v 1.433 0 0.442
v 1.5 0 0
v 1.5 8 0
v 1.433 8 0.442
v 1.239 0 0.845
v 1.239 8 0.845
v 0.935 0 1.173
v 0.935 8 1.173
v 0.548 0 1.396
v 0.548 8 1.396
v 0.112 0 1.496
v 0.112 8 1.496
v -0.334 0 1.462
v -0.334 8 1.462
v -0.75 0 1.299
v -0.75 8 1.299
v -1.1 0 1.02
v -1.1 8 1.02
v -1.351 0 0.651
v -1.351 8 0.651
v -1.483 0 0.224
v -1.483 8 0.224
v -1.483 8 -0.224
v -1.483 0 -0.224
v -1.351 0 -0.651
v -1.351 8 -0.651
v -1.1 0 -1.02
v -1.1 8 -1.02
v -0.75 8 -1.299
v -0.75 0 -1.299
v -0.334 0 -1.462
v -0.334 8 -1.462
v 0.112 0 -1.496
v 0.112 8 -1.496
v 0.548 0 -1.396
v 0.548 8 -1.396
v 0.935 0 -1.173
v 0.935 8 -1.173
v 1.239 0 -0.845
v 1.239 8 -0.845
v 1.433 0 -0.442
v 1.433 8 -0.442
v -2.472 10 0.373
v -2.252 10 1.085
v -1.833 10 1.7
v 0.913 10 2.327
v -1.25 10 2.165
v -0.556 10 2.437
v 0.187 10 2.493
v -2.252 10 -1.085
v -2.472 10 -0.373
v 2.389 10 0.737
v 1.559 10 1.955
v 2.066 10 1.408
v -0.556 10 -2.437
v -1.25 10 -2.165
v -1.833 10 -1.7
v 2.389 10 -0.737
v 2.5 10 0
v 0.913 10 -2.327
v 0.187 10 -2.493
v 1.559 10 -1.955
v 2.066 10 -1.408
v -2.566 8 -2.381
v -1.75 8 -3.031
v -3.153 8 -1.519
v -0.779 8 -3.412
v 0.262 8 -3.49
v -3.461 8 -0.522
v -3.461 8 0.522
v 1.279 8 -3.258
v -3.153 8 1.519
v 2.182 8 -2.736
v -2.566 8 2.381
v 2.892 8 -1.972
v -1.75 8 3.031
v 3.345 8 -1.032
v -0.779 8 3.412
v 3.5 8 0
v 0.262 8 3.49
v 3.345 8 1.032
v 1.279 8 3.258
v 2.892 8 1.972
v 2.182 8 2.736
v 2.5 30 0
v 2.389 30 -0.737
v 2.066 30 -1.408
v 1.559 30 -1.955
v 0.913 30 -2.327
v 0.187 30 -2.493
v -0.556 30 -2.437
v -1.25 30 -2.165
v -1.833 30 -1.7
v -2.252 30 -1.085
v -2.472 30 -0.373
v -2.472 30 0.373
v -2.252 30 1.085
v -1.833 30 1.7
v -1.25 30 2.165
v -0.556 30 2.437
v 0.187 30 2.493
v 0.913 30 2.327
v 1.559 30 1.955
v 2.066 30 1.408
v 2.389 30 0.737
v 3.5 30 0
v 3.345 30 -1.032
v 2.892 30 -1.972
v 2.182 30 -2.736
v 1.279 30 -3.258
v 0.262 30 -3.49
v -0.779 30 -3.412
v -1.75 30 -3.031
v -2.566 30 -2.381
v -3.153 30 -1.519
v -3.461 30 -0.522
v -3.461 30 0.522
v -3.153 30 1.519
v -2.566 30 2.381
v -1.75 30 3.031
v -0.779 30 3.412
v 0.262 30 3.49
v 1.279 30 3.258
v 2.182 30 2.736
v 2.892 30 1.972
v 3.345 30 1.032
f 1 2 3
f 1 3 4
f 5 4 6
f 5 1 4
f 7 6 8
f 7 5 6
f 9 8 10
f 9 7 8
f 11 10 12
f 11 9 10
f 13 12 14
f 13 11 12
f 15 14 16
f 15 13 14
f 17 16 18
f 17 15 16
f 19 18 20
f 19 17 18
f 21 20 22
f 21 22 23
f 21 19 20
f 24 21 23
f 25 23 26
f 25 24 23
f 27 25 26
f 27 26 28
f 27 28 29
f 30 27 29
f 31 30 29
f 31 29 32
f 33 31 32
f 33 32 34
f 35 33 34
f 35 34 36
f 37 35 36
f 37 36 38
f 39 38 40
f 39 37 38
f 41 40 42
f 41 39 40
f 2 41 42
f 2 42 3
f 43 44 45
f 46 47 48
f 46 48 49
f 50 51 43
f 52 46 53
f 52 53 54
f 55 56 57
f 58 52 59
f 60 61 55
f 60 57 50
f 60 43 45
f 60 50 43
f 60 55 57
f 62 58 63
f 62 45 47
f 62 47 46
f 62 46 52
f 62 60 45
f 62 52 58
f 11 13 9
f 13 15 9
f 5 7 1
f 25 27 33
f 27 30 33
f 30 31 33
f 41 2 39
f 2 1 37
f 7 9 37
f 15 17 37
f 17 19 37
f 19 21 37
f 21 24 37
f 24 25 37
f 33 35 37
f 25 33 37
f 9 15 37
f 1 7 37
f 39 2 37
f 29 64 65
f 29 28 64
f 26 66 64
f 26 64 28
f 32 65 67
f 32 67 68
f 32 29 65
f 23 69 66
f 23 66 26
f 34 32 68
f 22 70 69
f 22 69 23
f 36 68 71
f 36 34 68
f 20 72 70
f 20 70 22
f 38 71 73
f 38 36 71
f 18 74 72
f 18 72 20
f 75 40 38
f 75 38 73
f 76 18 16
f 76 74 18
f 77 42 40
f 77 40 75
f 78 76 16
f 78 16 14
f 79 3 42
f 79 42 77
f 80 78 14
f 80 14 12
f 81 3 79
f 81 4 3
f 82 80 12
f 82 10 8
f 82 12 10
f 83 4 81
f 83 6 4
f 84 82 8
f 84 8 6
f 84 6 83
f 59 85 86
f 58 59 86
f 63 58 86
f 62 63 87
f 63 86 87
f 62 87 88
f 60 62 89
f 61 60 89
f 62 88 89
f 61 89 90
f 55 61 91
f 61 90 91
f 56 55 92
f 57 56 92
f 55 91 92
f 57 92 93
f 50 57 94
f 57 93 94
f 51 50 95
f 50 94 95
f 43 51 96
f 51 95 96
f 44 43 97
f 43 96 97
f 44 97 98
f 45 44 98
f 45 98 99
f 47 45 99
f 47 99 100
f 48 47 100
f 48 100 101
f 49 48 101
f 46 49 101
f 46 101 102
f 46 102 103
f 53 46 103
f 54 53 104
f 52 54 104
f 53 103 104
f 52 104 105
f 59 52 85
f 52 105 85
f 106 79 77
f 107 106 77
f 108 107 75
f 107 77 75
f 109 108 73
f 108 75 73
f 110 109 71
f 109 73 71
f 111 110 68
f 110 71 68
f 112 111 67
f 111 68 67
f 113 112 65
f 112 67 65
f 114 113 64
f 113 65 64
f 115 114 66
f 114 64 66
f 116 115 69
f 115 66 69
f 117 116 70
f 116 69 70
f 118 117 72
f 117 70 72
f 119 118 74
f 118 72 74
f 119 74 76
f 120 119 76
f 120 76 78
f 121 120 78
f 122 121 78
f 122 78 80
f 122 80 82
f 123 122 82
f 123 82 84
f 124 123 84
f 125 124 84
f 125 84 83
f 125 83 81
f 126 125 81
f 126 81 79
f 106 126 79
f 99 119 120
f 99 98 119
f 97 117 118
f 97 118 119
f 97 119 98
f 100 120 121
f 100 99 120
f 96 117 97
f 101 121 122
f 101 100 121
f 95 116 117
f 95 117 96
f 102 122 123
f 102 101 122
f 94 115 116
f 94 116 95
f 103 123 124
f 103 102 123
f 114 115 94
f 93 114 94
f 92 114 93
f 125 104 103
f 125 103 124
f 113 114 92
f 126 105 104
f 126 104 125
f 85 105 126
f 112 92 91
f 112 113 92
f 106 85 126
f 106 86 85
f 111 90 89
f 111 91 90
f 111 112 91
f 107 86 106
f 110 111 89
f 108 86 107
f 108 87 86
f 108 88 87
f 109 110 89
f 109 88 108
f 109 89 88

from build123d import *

# Parameters (mm, degrees)
SKETCH1_R           = 3.5
BOSS_EXTRUDE1_DEPTH = 30
SKETCH2_R           = 2.5
CUT_EXTRUDE1_DEPTH  = 20
SKETCH3_R           = 3.5
SKETCH3_R_2         = 1.5
CUT_EXTRUDE4_DEPTH  = 8


with BuildPart() as part:
    # Sketch1 → Boss-Extrude1 (new body)
    with BuildSketch(Plane(origin=(0, 0, 0), x_dir=(1, 0, 0), z_dir=(0, 1, 0))):
        Circle(SKETCH1_R)
    extrude(amount=BOSS_EXTRUDE1_DEPTH)

    # Sketch2 → Cut-Extrude1 (cut)
    with BuildSketch(Plane(origin=(0, 30, 0), x_dir=(1, 0, 0), z_dir=(0, 1, 0))):
        Circle(SKETCH2_R)
    extrude(amount=-CUT_EXTRUDE1_DEPTH, mode=Mode.SUBTRACT)

    # Sketch3 → Cut-Extrude4 (cut)
    with BuildSketch(Plane.XZ):
        Circle(SKETCH3_R)
        Circle(SKETCH3_R_2, mode=Mode.SUBTRACT)
    extrude(amount=-CUT_EXTRUDE4_DEPTH, mode=Mode.SUBTRACT)


solid = part.part
